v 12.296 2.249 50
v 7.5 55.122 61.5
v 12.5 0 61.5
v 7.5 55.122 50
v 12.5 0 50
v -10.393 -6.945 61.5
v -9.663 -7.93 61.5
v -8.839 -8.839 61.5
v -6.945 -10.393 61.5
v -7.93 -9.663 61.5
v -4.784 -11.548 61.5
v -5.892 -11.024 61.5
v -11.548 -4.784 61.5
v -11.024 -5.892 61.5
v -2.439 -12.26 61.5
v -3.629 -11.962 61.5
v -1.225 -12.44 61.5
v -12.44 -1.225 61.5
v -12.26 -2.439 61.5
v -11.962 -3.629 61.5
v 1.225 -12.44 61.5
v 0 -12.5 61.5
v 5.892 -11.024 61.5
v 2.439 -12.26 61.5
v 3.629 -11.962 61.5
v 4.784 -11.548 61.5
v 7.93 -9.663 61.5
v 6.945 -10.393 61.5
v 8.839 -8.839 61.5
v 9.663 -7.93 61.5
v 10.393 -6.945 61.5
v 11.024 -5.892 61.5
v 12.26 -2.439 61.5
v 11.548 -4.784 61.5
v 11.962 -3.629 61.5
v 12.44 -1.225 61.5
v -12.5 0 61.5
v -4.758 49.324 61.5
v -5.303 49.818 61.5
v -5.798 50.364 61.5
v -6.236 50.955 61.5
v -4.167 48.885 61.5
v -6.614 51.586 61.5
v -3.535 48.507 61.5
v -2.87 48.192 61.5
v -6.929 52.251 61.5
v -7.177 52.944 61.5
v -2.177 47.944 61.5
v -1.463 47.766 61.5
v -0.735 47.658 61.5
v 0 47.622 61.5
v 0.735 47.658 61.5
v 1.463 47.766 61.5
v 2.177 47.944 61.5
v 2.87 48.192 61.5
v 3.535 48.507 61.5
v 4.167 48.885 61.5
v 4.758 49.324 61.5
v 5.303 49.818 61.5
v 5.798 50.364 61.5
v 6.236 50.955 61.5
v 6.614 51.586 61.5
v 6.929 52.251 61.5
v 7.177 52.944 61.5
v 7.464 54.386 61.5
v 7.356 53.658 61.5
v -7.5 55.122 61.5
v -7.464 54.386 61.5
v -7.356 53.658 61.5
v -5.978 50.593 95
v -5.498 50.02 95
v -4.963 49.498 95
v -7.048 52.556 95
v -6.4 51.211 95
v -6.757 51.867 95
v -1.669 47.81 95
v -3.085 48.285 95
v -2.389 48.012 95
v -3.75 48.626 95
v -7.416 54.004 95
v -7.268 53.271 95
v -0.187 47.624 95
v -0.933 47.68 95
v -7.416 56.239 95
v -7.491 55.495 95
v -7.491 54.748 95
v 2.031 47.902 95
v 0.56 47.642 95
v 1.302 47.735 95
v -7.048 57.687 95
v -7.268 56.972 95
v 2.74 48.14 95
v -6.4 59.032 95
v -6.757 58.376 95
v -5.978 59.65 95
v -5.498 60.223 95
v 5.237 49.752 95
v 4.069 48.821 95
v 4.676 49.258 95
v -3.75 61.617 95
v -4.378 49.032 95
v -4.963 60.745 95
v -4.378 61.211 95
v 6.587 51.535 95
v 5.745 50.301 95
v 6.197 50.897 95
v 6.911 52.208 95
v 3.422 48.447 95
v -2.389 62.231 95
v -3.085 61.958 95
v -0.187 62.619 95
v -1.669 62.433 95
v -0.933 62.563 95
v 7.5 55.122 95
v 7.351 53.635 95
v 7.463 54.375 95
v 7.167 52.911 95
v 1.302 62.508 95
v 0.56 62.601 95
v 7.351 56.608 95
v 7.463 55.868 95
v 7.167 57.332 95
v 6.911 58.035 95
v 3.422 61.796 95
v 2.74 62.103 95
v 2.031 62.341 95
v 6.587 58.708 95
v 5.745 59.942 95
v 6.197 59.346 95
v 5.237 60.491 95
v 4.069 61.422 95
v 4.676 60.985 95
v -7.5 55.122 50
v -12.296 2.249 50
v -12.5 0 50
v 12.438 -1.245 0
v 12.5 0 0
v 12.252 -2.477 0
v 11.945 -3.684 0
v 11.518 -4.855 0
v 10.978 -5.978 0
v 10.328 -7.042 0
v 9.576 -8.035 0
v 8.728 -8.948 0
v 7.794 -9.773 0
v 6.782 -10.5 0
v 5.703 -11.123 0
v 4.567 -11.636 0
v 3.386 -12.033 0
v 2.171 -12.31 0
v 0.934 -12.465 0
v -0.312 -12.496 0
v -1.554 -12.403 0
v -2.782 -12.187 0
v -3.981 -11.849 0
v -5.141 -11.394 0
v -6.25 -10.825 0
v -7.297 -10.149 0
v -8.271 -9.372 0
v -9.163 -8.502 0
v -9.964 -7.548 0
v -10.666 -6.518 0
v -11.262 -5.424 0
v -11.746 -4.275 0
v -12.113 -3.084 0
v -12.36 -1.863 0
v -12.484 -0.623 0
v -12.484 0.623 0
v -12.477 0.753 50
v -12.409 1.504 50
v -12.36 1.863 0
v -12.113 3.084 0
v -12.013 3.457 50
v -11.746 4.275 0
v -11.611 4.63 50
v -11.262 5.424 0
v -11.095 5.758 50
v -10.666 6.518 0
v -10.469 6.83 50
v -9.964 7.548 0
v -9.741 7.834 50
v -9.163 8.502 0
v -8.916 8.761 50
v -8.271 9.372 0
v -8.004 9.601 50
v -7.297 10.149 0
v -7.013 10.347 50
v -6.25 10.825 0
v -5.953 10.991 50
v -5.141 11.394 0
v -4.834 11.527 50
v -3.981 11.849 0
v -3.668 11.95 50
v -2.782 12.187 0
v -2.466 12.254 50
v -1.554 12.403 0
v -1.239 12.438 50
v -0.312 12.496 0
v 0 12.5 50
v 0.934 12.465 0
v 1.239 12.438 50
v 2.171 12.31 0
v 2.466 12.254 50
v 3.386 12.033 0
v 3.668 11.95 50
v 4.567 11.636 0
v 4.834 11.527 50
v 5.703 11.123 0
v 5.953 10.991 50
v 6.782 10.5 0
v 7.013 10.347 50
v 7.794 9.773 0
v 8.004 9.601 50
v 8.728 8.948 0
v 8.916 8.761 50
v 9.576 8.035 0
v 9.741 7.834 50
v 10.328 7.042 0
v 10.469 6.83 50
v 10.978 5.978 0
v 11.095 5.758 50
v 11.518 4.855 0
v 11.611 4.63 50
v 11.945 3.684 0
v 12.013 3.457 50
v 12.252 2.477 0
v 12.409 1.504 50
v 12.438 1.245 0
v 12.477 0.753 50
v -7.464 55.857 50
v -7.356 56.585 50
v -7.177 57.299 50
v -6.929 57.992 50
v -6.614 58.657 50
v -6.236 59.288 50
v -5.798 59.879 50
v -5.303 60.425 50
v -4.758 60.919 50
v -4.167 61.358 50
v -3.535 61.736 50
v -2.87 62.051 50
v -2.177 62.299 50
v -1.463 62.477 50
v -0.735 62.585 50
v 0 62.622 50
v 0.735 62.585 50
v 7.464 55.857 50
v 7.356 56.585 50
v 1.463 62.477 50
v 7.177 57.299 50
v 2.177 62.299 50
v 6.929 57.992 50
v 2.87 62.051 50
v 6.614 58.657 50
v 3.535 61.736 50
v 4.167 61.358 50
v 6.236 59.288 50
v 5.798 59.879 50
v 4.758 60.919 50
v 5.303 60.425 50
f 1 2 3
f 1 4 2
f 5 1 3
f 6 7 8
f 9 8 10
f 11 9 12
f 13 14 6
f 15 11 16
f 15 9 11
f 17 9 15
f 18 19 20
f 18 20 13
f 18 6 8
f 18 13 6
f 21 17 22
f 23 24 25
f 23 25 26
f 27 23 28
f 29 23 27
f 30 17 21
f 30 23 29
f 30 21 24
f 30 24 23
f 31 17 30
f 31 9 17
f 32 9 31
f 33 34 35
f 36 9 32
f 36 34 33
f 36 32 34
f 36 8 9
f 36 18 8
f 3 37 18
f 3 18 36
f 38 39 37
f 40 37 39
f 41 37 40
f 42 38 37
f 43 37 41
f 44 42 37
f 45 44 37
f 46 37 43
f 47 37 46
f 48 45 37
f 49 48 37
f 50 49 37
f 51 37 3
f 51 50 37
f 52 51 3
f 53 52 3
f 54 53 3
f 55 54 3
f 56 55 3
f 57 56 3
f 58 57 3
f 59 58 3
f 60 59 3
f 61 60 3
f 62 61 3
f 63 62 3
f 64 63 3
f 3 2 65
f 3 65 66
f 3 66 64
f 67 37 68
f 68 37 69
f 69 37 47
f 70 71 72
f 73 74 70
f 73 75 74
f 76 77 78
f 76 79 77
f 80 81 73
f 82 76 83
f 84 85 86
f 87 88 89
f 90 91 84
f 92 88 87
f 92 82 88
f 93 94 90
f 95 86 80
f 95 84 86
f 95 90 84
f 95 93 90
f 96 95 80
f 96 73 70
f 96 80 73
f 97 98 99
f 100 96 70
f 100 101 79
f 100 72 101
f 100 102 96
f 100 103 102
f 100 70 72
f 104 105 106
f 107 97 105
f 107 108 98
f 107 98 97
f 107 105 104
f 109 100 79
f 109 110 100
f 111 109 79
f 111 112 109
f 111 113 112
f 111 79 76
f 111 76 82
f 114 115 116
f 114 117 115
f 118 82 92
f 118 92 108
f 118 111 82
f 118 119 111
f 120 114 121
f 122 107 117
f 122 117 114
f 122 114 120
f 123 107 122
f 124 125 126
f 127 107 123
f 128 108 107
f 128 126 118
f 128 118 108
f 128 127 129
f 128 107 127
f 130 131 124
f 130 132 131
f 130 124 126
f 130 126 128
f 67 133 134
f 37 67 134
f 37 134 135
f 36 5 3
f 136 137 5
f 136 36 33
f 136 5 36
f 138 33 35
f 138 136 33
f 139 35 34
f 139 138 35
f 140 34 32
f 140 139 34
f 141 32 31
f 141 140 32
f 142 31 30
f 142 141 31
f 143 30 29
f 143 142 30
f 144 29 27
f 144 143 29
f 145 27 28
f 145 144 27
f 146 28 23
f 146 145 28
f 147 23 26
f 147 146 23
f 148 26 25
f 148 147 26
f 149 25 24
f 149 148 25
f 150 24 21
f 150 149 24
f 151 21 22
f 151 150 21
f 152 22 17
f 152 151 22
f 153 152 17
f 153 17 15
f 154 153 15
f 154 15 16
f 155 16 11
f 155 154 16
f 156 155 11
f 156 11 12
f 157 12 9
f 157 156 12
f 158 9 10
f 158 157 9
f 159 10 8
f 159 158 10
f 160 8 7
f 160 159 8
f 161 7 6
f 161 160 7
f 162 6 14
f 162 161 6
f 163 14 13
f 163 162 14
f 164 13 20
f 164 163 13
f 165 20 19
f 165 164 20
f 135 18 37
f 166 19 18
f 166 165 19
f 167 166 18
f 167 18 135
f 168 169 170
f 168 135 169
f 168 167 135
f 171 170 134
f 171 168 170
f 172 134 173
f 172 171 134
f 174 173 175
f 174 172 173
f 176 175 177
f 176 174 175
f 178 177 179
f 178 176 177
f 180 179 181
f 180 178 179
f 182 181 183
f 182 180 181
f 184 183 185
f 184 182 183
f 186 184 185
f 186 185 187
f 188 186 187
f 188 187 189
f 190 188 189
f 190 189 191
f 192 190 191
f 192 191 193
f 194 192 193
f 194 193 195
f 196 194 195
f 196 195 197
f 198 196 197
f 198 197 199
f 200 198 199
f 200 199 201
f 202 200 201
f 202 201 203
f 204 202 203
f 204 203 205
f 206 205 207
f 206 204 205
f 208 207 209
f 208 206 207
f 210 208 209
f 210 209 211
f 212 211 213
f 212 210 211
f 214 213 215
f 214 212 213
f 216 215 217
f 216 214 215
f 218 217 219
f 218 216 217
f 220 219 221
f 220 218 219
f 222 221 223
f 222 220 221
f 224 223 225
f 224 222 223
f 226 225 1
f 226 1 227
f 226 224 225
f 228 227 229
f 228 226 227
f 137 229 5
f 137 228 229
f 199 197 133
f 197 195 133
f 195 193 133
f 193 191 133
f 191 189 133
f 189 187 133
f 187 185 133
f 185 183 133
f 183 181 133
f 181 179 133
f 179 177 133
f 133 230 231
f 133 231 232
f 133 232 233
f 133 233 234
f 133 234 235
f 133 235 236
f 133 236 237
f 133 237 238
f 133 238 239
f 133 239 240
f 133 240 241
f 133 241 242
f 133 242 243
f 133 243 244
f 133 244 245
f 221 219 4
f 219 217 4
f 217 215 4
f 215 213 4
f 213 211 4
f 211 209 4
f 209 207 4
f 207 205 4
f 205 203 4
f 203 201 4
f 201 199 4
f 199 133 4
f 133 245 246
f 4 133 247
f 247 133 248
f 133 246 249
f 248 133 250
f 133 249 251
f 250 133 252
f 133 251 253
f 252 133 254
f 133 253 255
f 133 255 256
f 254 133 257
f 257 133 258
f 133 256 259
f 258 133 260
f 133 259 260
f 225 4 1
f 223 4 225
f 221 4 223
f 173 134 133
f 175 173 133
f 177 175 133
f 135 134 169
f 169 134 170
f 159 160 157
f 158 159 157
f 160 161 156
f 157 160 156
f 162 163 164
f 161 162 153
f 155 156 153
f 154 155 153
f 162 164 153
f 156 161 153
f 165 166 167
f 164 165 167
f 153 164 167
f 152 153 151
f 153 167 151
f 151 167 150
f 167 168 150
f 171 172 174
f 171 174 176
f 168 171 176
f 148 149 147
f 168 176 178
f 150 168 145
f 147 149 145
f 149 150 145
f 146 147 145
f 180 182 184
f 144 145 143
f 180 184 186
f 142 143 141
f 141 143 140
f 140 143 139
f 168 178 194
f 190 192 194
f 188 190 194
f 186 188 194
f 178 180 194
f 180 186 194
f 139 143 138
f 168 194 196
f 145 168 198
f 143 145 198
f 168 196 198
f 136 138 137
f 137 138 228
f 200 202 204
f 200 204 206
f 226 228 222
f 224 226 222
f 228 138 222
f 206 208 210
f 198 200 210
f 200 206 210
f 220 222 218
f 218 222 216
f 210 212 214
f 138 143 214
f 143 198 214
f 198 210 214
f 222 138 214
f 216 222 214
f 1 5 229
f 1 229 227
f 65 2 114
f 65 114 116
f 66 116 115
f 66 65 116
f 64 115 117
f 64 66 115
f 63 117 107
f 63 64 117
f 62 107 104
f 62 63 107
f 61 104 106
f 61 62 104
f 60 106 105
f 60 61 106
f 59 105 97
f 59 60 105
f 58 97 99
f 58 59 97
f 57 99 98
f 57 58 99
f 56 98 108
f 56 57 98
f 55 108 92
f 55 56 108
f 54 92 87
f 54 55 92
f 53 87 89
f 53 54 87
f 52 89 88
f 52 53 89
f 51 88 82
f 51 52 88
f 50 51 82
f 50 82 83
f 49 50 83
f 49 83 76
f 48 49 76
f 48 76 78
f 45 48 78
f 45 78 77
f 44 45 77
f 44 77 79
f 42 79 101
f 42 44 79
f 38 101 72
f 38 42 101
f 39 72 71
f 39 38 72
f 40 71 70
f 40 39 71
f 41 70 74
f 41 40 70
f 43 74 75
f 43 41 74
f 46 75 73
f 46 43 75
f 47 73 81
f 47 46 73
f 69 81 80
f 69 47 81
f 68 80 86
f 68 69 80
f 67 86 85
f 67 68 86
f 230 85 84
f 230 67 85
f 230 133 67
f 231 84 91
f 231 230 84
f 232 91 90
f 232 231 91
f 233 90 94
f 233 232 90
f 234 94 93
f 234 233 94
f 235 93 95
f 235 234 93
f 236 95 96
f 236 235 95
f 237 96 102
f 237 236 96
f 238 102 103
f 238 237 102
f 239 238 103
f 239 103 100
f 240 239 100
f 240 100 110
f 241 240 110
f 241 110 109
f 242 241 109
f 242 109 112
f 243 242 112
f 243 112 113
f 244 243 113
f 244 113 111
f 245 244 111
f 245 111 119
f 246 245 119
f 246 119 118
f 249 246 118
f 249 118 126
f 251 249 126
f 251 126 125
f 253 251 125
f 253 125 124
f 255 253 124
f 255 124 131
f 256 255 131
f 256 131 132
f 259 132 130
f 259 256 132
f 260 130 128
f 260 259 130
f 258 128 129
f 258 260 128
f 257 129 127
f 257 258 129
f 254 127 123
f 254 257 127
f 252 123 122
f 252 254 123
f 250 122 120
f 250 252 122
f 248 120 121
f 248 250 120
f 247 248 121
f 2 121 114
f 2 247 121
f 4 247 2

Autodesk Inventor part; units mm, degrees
ref_plane "YZ Plane" through (0, 0, 0) normal (1, 0, 0) x (0, 1, 0)
ref_plane "XZ Plane" through (0, 0, 0) normal (0, 1, 0) x (-1, 0, 0)
ref_plane "XY Plane" through (0, 0, 0) normal (0, 0, 1) x (1, 0, 0)
sketch "Sketch1" plane through (0, 0, 0) normal (0, 0, 1) x (1, 0, 0)
  circle A0 centre (0, 0) radius 12.5
  dimension "d0" = 25
extrude "Extrusion1" add sketch "Sketch1" along normal blind 50
sketch "Sketch2" plane through (0, 0, 50) normal (0, 0, 1) x (1, 0, 0)
  circle A0 centre (0, 55.1215) radius 7.5
  line L0 (-7.5, 55.1215) -> (-12.5, 0)
  circle A1 centre (0, 0) radius 12.5 projected
  line L1 (7.5, 55.1215) -> (12.5, 0)
  dimension "d3" = 15
extrude "Extrusion2" add sketch "Sketch2" along normal blind 11.5 contours L1 A1 L0 A0 | L1 A1 L0
extrude "Extrusion3" add sketch "Sketch2" along normal blind 45 contours A0
